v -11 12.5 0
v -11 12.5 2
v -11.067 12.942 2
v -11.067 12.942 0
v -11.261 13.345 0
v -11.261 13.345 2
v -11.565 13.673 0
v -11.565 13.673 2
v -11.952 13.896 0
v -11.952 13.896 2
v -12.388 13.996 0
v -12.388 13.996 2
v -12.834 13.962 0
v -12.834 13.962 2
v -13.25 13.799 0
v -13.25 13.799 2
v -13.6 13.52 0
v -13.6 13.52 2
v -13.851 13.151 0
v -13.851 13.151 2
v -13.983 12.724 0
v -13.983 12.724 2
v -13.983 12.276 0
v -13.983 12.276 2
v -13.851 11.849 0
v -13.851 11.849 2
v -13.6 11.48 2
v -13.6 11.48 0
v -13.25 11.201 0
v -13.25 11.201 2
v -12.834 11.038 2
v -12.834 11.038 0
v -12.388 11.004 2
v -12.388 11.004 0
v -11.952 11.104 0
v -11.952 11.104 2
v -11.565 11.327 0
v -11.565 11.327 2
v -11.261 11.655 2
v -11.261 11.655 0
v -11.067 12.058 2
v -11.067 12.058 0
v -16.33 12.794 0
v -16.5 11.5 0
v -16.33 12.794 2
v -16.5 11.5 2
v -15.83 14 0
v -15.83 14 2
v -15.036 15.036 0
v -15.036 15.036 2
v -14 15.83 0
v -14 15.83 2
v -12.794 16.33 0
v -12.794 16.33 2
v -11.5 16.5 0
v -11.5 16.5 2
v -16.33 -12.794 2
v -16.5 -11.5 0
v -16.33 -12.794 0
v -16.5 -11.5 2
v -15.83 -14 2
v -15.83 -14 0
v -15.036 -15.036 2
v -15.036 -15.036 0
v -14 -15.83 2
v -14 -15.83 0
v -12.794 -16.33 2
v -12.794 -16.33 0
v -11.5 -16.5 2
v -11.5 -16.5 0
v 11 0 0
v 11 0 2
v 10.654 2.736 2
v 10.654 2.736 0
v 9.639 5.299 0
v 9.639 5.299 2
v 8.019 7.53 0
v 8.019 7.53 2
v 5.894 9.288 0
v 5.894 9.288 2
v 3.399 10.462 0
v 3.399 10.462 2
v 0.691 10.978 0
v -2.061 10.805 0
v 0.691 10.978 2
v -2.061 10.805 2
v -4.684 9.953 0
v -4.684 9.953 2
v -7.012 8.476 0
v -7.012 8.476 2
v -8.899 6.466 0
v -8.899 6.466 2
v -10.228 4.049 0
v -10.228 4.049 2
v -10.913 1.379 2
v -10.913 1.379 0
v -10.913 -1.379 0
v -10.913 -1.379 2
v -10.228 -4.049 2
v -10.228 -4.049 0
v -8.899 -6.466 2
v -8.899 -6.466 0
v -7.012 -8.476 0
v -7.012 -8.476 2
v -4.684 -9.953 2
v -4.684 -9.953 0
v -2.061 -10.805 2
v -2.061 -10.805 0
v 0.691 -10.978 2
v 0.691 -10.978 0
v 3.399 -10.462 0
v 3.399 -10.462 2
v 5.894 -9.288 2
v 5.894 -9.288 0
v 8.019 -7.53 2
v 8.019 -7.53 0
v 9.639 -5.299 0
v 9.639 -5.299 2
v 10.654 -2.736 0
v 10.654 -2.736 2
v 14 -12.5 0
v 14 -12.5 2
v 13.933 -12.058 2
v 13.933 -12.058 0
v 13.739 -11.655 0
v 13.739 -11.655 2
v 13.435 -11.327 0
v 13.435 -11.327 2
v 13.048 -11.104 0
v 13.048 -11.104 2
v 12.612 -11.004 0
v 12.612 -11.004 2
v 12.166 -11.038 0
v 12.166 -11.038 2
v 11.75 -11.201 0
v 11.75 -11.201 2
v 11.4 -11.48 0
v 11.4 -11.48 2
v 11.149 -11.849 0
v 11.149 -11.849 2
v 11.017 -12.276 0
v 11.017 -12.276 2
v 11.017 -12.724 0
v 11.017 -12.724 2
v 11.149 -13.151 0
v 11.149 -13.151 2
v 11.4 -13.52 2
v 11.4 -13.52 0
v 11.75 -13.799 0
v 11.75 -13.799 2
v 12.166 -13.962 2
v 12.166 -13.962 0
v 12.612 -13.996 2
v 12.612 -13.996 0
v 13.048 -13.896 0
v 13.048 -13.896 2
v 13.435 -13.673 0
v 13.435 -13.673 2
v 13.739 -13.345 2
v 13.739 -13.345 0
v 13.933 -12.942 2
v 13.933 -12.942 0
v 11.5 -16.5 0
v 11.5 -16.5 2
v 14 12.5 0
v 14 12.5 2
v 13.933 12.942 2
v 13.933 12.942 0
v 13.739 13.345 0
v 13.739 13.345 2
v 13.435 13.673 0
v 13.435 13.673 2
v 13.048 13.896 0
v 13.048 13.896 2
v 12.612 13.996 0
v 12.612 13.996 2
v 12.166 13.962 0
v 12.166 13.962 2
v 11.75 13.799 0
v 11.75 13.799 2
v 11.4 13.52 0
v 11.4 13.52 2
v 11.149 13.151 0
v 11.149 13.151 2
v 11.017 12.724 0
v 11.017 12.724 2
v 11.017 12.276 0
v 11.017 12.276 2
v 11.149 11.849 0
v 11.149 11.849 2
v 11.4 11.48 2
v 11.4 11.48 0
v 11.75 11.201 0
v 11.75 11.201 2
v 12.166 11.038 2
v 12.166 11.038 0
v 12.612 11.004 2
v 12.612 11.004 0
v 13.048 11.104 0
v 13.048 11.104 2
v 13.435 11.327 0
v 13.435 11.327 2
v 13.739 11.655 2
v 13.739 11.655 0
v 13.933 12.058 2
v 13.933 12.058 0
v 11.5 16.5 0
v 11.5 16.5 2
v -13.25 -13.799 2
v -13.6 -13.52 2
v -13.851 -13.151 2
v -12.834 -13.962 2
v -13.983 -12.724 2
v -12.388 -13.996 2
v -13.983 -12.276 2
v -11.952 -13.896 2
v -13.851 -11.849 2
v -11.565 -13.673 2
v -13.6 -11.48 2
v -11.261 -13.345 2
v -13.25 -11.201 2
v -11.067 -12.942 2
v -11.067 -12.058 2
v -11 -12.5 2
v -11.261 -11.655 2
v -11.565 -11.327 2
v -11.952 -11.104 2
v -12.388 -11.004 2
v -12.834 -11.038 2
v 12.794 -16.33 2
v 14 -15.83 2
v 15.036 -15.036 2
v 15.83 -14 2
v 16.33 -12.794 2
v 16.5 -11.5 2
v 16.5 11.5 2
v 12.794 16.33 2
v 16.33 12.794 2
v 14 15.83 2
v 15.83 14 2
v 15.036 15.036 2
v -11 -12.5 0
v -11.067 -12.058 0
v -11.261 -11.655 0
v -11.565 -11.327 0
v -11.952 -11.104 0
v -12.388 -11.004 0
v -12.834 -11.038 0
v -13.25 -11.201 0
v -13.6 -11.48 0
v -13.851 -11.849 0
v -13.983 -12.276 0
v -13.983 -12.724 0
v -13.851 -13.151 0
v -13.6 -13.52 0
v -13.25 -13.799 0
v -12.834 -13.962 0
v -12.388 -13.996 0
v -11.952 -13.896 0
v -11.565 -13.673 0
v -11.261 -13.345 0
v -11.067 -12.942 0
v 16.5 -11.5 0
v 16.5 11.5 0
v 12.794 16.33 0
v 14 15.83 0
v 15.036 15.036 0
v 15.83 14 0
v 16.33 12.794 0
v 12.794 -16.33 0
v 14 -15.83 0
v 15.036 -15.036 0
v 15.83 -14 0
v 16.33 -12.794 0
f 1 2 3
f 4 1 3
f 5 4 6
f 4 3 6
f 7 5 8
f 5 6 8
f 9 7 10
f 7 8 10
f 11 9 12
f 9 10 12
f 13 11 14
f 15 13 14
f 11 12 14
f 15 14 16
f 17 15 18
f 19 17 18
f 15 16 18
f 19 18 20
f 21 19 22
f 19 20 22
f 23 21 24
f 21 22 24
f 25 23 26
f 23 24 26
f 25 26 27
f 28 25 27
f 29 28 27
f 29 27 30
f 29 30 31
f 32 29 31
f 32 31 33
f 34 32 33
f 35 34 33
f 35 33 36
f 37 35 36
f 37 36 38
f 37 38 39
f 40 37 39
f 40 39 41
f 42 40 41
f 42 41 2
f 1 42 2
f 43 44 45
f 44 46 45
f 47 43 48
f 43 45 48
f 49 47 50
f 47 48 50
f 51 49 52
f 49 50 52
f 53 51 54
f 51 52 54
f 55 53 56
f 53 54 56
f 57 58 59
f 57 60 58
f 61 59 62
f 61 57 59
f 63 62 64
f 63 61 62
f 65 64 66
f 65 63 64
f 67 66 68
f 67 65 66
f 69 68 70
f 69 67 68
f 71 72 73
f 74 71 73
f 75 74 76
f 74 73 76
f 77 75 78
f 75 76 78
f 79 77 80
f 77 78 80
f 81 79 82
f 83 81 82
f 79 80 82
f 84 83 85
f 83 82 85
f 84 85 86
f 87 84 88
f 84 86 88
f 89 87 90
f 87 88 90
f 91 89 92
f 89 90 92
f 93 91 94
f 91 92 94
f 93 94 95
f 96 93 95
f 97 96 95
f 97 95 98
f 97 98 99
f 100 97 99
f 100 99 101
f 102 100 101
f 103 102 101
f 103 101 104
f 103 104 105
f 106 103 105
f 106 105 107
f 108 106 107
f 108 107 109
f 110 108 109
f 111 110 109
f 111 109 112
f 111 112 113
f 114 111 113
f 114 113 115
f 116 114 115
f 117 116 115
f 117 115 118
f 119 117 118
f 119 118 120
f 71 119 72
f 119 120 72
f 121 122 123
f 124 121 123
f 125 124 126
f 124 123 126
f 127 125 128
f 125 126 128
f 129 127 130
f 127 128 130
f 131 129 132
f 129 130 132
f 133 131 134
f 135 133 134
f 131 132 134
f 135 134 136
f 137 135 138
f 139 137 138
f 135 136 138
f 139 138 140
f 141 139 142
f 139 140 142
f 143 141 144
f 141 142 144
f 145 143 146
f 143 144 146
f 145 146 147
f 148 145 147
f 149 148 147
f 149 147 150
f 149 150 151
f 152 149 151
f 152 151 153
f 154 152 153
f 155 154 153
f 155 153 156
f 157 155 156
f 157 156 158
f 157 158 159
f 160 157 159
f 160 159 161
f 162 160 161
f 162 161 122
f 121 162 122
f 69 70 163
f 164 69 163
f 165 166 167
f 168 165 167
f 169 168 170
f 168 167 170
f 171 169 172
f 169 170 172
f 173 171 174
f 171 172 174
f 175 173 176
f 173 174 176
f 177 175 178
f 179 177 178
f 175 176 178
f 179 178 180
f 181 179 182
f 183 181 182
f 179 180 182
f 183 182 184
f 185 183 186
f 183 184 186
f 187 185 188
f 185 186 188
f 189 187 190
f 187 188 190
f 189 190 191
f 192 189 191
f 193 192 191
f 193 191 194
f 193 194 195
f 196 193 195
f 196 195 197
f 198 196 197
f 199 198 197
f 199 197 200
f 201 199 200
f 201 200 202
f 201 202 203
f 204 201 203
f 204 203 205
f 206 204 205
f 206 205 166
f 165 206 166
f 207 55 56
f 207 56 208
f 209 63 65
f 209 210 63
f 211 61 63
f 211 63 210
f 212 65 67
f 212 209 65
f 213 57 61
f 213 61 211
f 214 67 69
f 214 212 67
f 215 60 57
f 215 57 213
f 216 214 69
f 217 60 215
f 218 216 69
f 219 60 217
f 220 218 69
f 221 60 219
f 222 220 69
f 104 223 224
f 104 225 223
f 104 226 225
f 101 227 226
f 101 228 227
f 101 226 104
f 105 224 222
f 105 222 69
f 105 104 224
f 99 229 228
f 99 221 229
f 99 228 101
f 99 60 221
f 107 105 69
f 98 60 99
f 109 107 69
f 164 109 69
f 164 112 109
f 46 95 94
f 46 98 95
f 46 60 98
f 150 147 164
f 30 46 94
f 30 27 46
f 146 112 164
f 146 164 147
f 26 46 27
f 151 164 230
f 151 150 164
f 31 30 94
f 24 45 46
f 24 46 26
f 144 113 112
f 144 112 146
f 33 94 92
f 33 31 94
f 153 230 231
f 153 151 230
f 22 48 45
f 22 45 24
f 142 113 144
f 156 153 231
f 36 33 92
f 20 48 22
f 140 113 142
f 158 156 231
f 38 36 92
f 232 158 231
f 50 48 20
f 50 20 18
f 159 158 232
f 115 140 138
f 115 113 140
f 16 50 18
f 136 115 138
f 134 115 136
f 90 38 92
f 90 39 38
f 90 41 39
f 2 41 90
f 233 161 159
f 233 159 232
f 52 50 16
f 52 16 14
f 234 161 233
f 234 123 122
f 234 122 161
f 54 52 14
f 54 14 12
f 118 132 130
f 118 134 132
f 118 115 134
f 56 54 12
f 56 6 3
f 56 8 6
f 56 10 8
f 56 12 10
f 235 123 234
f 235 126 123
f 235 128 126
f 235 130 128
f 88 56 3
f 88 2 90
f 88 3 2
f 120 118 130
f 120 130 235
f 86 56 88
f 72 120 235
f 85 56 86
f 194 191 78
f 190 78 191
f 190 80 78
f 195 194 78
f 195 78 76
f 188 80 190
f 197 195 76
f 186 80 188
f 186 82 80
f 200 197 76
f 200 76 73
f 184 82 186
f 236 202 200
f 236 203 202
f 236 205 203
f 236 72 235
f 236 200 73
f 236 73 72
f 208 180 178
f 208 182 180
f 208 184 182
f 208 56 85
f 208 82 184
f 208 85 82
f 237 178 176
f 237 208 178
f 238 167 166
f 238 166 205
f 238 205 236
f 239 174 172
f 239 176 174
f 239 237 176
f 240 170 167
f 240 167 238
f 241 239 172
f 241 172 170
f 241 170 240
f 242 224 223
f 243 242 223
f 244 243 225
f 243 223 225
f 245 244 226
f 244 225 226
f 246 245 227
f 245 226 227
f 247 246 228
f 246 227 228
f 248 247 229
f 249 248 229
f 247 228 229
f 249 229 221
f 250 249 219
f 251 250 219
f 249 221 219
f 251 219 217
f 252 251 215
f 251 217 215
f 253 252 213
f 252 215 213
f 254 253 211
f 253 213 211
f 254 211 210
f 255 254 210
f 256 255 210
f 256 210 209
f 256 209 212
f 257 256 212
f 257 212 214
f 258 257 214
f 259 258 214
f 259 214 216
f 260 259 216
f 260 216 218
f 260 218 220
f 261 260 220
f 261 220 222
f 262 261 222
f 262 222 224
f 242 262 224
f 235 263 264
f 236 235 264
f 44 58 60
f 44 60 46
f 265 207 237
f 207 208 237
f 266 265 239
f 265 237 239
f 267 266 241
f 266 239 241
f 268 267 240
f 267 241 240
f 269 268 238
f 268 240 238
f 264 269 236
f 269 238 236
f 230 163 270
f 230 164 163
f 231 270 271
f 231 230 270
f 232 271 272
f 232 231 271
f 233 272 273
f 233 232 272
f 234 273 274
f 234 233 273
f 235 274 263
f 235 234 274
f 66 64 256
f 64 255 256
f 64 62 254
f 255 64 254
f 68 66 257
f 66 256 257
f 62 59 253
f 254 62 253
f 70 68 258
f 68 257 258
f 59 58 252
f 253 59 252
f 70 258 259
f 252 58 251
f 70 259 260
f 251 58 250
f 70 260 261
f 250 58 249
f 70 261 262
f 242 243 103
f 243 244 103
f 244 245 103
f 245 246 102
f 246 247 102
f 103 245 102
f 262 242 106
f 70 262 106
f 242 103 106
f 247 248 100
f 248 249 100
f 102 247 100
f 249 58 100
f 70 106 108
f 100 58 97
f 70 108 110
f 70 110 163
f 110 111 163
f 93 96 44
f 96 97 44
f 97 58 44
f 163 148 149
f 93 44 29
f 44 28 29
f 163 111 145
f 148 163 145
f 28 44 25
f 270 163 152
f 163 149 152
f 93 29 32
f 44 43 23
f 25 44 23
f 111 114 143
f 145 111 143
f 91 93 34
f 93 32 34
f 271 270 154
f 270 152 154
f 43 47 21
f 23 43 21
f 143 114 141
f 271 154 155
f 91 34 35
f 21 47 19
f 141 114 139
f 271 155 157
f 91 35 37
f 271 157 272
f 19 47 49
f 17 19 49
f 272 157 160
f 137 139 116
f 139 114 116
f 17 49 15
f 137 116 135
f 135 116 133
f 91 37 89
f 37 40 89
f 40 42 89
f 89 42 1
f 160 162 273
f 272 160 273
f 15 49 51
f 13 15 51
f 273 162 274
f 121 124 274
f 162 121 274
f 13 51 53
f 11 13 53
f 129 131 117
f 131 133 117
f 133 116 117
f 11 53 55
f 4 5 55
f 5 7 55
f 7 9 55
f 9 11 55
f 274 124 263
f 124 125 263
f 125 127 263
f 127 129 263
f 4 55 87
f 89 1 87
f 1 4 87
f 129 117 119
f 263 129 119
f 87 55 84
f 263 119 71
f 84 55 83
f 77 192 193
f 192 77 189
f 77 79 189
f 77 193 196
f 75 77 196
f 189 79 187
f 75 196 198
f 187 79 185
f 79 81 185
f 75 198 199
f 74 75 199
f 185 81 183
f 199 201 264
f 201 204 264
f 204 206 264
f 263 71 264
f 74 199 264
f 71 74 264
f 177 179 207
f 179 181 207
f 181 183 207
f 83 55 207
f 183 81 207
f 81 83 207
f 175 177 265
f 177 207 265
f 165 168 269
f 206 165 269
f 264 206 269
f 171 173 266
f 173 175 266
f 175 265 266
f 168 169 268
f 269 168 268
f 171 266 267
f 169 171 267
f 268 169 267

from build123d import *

# Parameters (mm, degrees)
SKETCH_1_W          = 33
SKETCH_1_H          = 33
EXTRUDE_1_DEPTH     = 2
SKETCH_2_R          = 1.5
CUT_EXTRUDE_1_DEPTH = 24.420076857
FILLET_1_R          = 5
SKETCH_3_R          = 11
CUT_EXTRUDE_2_DEPTH = 24.420076857


with BuildPart() as part:
    # 草图1 → 凸台-拉伸1 (new body)
    with BuildSketch(Plane.XY):
        Rectangle(SKETCH_1_W, SKETCH_1_H)
    extrude(amount=EXTRUDE_1_DEPTH)

    # 草图2 → 切除-拉伸1 (cut, through all)
    with BuildSketch(Plane.XY.offset(2)):
        with Locations((-12.5, 12.5)):
            Circle(SKETCH_2_R)
        with Locations((-12.5, -12.5)):
            Circle(SKETCH_2_R)
        with Locations((12.5, -12.5)):
            Circle(SKETCH_2_R)
        with Locations((12.5, 12.5)):
            Circle(SKETCH_2_R)
    extrude(amount=-CUT_EXTRUDE_1_DEPTH, mode=Mode.SUBTRACT)

    # 圆角1
    fillet_1_edges = [part.edges().sort_by_distance(p)[0] for p in [
        (16.5, -16.5, 1),
        (-16.5, -16.5, 1),
        (-16.5, 16.5, 1),
        (16.5, 16.5, 1),
    ]]
    fillet(fillet_1_edges, radius=FILLET_1_R)

    # 草图3 → 切除-拉伸2 (cut, through all)
    with BuildSketch(Plane.XY.offset(2)):
        Circle(SKETCH_3_R)
    extrude(amount=-CUT_EXTRUDE_2_DEPTH, mode=Mode.SUBTRACT)


solid = part.part
